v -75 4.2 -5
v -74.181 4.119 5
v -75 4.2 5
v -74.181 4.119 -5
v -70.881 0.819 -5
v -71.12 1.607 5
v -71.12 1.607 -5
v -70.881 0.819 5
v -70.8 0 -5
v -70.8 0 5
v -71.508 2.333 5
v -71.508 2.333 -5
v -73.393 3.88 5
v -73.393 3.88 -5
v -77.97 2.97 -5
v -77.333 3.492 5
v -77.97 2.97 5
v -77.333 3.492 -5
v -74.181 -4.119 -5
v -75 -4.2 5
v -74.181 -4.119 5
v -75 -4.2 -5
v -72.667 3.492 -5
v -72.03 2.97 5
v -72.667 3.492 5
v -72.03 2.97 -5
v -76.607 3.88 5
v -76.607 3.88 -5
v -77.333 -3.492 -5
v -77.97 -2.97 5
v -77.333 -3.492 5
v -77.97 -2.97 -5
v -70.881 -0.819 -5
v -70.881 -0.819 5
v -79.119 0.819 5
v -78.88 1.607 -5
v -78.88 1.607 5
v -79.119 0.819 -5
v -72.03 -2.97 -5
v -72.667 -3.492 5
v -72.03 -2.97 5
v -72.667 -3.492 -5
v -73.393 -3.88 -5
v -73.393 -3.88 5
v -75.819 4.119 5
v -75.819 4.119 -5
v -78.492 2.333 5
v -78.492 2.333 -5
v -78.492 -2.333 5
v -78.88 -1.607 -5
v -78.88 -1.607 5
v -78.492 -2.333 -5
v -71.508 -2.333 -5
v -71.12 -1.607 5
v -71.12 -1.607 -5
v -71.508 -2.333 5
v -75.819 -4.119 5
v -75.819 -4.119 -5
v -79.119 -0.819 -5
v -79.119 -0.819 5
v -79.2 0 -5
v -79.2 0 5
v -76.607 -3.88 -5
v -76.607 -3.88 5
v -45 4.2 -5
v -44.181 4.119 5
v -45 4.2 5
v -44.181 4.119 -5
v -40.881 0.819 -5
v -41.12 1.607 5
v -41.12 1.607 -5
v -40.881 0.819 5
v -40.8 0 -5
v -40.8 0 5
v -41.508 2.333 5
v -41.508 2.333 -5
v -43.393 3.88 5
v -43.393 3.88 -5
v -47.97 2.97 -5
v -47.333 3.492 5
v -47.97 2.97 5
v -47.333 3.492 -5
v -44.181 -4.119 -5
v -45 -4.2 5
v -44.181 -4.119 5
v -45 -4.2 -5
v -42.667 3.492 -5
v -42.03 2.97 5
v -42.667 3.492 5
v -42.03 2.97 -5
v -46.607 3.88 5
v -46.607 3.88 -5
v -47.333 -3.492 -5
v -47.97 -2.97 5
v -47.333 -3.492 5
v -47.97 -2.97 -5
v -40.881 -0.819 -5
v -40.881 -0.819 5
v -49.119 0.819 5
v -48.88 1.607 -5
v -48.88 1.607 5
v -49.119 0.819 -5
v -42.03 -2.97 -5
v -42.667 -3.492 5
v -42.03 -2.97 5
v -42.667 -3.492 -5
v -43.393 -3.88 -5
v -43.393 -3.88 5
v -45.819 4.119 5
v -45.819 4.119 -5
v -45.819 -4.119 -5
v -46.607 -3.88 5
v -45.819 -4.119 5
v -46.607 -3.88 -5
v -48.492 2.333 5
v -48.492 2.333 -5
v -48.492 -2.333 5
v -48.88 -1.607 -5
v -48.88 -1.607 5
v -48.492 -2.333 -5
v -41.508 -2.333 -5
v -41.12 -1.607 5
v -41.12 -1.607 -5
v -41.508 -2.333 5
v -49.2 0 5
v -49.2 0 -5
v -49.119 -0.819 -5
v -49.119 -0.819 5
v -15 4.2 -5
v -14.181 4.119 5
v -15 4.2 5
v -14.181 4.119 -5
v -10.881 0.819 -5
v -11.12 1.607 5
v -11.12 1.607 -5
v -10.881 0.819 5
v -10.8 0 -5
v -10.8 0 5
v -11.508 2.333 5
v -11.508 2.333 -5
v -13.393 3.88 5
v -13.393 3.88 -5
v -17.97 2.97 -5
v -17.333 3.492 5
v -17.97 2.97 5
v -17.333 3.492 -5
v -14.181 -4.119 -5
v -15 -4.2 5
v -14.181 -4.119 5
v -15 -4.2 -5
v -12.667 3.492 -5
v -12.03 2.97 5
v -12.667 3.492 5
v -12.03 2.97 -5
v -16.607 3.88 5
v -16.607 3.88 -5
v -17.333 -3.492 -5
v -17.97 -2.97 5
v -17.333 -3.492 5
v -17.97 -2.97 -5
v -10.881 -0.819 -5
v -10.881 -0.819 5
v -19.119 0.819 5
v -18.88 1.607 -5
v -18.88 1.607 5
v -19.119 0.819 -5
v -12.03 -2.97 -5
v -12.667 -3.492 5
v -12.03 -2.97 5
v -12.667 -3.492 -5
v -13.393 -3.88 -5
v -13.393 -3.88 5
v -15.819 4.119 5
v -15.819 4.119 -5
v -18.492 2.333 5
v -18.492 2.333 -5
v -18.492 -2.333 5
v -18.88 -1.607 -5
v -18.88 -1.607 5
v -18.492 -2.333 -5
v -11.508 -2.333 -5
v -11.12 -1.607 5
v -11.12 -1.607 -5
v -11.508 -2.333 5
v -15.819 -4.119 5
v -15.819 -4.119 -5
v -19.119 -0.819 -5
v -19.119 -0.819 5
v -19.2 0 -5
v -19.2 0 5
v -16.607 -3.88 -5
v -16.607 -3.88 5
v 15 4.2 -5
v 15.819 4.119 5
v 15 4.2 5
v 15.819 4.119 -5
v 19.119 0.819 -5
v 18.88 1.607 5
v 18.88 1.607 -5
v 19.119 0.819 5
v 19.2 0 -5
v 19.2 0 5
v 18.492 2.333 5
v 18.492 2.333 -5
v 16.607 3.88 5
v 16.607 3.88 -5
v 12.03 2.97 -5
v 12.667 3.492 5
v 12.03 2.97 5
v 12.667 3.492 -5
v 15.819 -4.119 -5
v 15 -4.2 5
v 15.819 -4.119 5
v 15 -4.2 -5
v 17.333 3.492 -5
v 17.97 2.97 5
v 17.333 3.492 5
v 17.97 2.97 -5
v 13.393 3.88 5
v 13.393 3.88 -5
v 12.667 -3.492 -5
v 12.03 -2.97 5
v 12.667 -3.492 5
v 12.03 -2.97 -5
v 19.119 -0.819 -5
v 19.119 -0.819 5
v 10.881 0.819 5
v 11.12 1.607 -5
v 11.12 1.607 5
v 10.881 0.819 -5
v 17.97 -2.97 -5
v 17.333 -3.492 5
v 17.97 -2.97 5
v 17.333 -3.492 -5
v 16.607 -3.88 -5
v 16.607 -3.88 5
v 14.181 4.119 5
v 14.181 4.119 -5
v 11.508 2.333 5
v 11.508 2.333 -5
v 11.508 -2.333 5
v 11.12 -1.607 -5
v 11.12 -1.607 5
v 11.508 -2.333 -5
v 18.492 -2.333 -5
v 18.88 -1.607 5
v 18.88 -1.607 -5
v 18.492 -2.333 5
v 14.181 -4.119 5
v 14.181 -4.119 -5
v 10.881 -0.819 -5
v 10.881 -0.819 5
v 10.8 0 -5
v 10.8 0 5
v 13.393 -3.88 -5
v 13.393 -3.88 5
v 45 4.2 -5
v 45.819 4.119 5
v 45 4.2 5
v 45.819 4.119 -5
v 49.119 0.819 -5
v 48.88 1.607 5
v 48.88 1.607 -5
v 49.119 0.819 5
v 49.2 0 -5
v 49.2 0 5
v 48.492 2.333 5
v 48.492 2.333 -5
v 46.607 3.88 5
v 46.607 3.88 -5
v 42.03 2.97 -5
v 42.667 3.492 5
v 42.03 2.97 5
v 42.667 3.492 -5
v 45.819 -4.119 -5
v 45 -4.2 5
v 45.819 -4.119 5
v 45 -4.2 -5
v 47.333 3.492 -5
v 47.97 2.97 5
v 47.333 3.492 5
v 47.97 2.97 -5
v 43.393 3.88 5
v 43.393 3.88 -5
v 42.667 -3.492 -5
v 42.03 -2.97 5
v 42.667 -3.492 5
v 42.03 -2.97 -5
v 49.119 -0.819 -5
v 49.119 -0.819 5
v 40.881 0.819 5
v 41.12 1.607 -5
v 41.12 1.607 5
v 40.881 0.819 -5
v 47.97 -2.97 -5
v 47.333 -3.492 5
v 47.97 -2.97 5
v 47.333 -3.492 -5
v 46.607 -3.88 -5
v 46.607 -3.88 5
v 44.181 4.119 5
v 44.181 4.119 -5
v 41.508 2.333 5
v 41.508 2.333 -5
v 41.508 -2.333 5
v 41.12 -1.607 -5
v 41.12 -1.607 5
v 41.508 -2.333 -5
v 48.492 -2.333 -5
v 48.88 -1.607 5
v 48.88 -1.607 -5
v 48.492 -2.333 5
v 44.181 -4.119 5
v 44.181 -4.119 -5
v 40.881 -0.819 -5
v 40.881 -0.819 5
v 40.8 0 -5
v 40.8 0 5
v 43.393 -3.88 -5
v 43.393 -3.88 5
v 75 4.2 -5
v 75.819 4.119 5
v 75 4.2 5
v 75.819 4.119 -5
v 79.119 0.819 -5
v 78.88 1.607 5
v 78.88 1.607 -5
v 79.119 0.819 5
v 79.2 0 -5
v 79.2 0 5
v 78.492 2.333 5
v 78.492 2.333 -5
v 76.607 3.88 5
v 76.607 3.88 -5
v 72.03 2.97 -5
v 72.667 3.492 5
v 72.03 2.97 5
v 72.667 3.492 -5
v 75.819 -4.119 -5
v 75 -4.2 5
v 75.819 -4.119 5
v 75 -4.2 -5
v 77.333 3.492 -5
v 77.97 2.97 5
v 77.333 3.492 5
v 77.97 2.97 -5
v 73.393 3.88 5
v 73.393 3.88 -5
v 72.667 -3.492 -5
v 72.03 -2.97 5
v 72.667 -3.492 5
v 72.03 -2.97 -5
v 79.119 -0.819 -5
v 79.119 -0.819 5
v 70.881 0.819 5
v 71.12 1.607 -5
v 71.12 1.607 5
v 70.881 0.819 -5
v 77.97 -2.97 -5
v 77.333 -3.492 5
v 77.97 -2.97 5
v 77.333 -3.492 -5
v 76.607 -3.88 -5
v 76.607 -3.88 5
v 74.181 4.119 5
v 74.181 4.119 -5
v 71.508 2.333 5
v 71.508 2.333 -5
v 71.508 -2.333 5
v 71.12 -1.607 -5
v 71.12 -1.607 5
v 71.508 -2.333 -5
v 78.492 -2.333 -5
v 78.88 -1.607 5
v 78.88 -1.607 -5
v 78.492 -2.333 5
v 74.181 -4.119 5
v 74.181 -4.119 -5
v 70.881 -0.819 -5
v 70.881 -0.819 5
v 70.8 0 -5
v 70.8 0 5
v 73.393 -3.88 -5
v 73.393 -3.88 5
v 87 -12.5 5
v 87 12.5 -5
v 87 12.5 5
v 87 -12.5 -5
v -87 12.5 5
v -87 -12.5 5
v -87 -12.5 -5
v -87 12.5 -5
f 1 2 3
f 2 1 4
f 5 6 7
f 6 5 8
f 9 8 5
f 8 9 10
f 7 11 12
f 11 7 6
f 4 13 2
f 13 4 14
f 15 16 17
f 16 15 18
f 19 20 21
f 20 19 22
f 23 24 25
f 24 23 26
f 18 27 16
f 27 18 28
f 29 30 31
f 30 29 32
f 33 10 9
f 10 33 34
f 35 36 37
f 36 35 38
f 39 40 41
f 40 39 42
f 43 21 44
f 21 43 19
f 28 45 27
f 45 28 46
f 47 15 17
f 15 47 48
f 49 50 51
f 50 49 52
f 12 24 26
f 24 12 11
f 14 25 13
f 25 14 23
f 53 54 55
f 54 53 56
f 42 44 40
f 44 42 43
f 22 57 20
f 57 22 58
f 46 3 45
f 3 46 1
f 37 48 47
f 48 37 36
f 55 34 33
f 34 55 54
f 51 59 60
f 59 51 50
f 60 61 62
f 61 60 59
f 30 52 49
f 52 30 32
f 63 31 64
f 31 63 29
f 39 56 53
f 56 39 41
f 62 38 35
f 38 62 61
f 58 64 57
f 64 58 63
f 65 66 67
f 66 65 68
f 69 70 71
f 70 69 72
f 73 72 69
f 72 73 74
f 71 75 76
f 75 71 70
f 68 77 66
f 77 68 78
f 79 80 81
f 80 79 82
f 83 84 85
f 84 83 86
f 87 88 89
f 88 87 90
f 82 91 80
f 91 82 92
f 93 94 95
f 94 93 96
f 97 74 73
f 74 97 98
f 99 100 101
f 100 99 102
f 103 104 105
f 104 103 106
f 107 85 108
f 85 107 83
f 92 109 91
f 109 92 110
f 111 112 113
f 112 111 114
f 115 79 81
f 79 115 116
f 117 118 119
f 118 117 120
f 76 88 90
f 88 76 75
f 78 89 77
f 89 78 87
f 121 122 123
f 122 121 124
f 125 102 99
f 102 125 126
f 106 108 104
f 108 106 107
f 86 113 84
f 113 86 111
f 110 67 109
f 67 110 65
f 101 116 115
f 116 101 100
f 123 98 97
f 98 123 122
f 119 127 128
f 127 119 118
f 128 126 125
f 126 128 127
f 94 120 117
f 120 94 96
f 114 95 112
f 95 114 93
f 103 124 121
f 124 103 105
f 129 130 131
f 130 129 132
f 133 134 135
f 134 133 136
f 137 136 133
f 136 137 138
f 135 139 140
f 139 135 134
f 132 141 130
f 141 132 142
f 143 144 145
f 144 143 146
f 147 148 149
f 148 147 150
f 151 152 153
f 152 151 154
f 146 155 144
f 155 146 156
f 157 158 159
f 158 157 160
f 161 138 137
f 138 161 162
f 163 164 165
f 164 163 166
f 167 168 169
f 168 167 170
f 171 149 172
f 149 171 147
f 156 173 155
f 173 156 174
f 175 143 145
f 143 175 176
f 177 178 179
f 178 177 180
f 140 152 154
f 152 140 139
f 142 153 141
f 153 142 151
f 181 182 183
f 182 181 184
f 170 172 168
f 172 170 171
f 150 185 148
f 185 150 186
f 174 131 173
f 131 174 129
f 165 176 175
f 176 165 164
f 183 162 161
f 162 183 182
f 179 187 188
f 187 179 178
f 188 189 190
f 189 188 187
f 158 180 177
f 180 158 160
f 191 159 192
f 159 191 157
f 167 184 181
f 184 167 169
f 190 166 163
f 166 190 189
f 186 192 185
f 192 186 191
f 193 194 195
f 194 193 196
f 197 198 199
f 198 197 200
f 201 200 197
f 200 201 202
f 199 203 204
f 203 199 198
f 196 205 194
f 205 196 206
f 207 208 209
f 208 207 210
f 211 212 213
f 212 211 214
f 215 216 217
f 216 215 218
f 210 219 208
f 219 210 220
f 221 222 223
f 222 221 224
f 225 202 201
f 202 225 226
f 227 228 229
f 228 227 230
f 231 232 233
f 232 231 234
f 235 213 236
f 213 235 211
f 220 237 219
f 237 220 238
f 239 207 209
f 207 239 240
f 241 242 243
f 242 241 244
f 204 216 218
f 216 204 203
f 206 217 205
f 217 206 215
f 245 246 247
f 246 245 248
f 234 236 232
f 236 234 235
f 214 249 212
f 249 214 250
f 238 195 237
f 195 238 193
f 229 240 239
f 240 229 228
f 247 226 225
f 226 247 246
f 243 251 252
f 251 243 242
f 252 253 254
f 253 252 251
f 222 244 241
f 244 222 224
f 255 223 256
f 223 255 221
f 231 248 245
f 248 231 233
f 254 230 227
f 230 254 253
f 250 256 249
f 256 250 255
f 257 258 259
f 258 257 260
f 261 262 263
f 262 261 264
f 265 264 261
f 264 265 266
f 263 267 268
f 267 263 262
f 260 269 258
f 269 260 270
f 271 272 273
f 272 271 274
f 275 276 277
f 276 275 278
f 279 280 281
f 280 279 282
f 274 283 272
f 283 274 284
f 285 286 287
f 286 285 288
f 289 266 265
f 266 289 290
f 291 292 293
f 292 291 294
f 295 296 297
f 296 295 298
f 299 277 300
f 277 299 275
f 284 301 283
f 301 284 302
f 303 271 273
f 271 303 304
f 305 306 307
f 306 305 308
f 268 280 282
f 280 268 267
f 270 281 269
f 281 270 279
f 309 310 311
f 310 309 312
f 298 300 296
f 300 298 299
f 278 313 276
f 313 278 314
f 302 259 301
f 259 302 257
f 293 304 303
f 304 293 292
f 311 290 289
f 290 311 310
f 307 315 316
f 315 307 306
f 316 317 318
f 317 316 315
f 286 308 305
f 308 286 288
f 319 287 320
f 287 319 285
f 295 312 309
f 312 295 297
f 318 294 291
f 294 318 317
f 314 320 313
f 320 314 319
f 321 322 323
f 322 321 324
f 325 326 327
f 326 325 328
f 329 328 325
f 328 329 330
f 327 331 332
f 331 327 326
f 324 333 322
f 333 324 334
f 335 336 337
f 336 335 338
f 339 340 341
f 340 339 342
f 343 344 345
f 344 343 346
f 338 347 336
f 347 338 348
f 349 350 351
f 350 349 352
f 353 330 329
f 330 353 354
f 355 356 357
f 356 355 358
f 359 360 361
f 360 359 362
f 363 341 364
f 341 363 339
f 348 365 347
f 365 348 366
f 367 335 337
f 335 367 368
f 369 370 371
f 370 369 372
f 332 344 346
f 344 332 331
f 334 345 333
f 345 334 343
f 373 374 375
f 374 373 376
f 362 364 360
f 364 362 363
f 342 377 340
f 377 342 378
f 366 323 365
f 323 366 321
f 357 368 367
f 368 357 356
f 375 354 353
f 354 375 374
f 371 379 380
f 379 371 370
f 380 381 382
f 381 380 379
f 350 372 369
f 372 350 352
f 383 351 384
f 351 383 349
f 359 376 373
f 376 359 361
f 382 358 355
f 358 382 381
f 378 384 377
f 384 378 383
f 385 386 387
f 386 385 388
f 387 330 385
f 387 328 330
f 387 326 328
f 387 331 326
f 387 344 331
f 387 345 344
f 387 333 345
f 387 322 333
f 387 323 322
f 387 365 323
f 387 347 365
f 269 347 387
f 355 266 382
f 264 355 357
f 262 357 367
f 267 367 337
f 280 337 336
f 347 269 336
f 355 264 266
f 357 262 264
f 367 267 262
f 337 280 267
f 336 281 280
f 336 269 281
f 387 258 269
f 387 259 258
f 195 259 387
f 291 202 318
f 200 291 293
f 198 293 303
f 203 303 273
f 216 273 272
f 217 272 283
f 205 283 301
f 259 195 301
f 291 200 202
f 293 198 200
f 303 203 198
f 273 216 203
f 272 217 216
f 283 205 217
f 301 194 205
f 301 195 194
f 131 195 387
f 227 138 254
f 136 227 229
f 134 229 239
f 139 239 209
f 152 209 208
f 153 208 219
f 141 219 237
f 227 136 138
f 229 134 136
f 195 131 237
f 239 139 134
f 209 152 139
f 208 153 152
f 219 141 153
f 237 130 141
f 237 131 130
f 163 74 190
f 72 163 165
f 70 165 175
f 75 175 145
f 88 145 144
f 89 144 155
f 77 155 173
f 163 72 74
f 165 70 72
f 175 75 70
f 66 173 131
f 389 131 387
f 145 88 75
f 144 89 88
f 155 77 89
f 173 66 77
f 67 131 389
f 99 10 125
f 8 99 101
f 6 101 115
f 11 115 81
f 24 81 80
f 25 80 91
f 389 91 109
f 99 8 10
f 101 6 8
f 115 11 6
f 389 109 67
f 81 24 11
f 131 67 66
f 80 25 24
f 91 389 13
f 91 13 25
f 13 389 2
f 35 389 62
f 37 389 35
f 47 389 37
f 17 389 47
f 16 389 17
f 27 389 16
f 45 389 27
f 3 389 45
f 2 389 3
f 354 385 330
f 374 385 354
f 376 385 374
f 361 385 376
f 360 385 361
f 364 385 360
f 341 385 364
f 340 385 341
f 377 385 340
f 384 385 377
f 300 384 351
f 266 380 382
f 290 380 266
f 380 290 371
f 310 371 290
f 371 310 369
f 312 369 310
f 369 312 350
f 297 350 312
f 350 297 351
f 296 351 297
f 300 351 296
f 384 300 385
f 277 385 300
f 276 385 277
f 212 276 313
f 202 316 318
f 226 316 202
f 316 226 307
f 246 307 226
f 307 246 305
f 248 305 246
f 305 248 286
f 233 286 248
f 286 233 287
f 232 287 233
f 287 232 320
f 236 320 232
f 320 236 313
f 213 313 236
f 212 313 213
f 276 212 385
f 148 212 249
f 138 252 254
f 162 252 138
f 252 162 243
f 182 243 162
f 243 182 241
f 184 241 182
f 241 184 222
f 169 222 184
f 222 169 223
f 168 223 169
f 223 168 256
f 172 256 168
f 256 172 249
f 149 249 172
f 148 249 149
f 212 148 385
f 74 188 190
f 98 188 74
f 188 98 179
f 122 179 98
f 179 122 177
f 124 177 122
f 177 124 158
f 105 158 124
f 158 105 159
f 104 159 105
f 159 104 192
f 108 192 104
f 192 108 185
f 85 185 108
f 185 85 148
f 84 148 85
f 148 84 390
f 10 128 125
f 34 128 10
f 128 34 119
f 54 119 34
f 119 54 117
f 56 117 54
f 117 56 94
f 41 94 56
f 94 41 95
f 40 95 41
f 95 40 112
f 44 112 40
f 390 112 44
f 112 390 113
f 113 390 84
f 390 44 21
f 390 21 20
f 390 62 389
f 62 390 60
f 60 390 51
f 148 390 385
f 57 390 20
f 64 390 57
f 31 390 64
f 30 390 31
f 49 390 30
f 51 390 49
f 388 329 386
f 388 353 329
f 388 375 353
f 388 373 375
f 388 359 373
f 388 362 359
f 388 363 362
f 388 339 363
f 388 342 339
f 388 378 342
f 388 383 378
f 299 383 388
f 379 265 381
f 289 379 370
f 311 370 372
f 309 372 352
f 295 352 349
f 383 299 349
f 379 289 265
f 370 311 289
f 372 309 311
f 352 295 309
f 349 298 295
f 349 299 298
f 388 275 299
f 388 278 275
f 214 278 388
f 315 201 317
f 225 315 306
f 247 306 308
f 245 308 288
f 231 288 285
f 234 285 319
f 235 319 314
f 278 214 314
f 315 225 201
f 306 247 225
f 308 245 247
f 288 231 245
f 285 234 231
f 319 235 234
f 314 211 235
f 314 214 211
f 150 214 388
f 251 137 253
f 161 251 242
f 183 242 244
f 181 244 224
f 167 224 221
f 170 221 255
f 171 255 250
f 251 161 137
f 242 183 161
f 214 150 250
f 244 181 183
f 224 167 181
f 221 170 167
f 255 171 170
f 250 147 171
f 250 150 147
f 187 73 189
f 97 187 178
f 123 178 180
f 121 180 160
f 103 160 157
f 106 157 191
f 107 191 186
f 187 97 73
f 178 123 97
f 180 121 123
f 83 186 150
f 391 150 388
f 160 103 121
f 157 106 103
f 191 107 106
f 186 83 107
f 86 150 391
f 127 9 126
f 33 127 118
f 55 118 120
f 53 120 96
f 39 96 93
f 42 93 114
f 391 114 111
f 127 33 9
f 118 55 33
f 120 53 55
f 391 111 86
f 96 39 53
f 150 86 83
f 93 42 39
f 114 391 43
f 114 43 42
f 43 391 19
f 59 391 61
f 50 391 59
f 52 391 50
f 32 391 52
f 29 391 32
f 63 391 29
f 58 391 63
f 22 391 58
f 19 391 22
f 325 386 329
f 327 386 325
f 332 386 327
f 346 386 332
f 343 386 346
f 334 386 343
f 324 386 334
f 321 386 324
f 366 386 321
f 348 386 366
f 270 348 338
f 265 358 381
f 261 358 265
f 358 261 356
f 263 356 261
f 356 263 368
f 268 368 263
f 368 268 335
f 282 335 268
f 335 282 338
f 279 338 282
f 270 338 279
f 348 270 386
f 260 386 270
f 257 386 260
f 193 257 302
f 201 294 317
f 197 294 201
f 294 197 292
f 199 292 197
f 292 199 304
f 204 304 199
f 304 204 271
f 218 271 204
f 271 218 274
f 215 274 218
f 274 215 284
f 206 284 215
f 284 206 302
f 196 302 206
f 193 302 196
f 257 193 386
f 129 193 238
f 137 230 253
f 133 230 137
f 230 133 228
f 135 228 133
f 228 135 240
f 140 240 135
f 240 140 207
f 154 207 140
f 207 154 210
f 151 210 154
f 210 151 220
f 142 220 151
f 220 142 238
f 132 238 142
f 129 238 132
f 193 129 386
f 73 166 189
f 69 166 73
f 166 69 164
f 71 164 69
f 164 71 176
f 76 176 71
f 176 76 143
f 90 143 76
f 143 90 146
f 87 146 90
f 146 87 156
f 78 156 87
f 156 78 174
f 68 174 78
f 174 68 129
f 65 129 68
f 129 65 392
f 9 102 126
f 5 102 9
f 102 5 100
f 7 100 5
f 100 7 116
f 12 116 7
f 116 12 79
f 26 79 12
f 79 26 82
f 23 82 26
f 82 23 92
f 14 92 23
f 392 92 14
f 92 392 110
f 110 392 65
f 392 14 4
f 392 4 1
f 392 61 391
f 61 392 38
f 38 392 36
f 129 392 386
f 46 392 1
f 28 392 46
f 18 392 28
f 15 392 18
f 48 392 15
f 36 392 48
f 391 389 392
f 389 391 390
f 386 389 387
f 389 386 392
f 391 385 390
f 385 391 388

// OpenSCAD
$fn = 32;

// ----------------------------------------------------------------------
// Hole bar, 6 x Ø8.4
// skip layout, 12 mm edge offset
// ----------------------------------------------------------------------

// --- parameters (mm) ---
bar_w = 25;       // bar width (Y)
bar_t = 10;       // bar thickness (Z)
holes = 6;        // holes per row
hole_d = 8.4;     // hole diameter
edge = 12;        // offset from the bar end to the first hole
grid_pitch = 15;  // grid the bar was laid out on

// --- derived feature positions (mm) ---
pitch = grid_pitch * 2;       // = 30   holes sit every other grid slot
span = (holes - 1) * pitch;   // = 150   distance between the end holes
bar_l = span + 2 * edge;      // = 174   overall bar length
start_x = -bar_l / 2 + edge;  // = -75   X of the first hole
feature_centers = [
  [start_x + 0 * pitch, 0],
  [start_x + 1 * pitch, 0],
  [start_x + 2 * pitch, 0],
  [start_x + 3 * pitch, 0],
  [start_x + 4 * pitch, 0],
  [start_x + 5 * pitch, 0]
];   // hole centres of the first row

// bar with one row of holes, drilled from feature_centers
difference() {
  translate([-bar_l / 2, -bar_w / 2, -bar_t / 2]) cube([bar_l, bar_w, bar_t]);
  for (centre = feature_centers)
    translate([centre[0], centre[1], 0])
      cylinder(d = hole_d, h = bar_t + 2, center = true);
}
